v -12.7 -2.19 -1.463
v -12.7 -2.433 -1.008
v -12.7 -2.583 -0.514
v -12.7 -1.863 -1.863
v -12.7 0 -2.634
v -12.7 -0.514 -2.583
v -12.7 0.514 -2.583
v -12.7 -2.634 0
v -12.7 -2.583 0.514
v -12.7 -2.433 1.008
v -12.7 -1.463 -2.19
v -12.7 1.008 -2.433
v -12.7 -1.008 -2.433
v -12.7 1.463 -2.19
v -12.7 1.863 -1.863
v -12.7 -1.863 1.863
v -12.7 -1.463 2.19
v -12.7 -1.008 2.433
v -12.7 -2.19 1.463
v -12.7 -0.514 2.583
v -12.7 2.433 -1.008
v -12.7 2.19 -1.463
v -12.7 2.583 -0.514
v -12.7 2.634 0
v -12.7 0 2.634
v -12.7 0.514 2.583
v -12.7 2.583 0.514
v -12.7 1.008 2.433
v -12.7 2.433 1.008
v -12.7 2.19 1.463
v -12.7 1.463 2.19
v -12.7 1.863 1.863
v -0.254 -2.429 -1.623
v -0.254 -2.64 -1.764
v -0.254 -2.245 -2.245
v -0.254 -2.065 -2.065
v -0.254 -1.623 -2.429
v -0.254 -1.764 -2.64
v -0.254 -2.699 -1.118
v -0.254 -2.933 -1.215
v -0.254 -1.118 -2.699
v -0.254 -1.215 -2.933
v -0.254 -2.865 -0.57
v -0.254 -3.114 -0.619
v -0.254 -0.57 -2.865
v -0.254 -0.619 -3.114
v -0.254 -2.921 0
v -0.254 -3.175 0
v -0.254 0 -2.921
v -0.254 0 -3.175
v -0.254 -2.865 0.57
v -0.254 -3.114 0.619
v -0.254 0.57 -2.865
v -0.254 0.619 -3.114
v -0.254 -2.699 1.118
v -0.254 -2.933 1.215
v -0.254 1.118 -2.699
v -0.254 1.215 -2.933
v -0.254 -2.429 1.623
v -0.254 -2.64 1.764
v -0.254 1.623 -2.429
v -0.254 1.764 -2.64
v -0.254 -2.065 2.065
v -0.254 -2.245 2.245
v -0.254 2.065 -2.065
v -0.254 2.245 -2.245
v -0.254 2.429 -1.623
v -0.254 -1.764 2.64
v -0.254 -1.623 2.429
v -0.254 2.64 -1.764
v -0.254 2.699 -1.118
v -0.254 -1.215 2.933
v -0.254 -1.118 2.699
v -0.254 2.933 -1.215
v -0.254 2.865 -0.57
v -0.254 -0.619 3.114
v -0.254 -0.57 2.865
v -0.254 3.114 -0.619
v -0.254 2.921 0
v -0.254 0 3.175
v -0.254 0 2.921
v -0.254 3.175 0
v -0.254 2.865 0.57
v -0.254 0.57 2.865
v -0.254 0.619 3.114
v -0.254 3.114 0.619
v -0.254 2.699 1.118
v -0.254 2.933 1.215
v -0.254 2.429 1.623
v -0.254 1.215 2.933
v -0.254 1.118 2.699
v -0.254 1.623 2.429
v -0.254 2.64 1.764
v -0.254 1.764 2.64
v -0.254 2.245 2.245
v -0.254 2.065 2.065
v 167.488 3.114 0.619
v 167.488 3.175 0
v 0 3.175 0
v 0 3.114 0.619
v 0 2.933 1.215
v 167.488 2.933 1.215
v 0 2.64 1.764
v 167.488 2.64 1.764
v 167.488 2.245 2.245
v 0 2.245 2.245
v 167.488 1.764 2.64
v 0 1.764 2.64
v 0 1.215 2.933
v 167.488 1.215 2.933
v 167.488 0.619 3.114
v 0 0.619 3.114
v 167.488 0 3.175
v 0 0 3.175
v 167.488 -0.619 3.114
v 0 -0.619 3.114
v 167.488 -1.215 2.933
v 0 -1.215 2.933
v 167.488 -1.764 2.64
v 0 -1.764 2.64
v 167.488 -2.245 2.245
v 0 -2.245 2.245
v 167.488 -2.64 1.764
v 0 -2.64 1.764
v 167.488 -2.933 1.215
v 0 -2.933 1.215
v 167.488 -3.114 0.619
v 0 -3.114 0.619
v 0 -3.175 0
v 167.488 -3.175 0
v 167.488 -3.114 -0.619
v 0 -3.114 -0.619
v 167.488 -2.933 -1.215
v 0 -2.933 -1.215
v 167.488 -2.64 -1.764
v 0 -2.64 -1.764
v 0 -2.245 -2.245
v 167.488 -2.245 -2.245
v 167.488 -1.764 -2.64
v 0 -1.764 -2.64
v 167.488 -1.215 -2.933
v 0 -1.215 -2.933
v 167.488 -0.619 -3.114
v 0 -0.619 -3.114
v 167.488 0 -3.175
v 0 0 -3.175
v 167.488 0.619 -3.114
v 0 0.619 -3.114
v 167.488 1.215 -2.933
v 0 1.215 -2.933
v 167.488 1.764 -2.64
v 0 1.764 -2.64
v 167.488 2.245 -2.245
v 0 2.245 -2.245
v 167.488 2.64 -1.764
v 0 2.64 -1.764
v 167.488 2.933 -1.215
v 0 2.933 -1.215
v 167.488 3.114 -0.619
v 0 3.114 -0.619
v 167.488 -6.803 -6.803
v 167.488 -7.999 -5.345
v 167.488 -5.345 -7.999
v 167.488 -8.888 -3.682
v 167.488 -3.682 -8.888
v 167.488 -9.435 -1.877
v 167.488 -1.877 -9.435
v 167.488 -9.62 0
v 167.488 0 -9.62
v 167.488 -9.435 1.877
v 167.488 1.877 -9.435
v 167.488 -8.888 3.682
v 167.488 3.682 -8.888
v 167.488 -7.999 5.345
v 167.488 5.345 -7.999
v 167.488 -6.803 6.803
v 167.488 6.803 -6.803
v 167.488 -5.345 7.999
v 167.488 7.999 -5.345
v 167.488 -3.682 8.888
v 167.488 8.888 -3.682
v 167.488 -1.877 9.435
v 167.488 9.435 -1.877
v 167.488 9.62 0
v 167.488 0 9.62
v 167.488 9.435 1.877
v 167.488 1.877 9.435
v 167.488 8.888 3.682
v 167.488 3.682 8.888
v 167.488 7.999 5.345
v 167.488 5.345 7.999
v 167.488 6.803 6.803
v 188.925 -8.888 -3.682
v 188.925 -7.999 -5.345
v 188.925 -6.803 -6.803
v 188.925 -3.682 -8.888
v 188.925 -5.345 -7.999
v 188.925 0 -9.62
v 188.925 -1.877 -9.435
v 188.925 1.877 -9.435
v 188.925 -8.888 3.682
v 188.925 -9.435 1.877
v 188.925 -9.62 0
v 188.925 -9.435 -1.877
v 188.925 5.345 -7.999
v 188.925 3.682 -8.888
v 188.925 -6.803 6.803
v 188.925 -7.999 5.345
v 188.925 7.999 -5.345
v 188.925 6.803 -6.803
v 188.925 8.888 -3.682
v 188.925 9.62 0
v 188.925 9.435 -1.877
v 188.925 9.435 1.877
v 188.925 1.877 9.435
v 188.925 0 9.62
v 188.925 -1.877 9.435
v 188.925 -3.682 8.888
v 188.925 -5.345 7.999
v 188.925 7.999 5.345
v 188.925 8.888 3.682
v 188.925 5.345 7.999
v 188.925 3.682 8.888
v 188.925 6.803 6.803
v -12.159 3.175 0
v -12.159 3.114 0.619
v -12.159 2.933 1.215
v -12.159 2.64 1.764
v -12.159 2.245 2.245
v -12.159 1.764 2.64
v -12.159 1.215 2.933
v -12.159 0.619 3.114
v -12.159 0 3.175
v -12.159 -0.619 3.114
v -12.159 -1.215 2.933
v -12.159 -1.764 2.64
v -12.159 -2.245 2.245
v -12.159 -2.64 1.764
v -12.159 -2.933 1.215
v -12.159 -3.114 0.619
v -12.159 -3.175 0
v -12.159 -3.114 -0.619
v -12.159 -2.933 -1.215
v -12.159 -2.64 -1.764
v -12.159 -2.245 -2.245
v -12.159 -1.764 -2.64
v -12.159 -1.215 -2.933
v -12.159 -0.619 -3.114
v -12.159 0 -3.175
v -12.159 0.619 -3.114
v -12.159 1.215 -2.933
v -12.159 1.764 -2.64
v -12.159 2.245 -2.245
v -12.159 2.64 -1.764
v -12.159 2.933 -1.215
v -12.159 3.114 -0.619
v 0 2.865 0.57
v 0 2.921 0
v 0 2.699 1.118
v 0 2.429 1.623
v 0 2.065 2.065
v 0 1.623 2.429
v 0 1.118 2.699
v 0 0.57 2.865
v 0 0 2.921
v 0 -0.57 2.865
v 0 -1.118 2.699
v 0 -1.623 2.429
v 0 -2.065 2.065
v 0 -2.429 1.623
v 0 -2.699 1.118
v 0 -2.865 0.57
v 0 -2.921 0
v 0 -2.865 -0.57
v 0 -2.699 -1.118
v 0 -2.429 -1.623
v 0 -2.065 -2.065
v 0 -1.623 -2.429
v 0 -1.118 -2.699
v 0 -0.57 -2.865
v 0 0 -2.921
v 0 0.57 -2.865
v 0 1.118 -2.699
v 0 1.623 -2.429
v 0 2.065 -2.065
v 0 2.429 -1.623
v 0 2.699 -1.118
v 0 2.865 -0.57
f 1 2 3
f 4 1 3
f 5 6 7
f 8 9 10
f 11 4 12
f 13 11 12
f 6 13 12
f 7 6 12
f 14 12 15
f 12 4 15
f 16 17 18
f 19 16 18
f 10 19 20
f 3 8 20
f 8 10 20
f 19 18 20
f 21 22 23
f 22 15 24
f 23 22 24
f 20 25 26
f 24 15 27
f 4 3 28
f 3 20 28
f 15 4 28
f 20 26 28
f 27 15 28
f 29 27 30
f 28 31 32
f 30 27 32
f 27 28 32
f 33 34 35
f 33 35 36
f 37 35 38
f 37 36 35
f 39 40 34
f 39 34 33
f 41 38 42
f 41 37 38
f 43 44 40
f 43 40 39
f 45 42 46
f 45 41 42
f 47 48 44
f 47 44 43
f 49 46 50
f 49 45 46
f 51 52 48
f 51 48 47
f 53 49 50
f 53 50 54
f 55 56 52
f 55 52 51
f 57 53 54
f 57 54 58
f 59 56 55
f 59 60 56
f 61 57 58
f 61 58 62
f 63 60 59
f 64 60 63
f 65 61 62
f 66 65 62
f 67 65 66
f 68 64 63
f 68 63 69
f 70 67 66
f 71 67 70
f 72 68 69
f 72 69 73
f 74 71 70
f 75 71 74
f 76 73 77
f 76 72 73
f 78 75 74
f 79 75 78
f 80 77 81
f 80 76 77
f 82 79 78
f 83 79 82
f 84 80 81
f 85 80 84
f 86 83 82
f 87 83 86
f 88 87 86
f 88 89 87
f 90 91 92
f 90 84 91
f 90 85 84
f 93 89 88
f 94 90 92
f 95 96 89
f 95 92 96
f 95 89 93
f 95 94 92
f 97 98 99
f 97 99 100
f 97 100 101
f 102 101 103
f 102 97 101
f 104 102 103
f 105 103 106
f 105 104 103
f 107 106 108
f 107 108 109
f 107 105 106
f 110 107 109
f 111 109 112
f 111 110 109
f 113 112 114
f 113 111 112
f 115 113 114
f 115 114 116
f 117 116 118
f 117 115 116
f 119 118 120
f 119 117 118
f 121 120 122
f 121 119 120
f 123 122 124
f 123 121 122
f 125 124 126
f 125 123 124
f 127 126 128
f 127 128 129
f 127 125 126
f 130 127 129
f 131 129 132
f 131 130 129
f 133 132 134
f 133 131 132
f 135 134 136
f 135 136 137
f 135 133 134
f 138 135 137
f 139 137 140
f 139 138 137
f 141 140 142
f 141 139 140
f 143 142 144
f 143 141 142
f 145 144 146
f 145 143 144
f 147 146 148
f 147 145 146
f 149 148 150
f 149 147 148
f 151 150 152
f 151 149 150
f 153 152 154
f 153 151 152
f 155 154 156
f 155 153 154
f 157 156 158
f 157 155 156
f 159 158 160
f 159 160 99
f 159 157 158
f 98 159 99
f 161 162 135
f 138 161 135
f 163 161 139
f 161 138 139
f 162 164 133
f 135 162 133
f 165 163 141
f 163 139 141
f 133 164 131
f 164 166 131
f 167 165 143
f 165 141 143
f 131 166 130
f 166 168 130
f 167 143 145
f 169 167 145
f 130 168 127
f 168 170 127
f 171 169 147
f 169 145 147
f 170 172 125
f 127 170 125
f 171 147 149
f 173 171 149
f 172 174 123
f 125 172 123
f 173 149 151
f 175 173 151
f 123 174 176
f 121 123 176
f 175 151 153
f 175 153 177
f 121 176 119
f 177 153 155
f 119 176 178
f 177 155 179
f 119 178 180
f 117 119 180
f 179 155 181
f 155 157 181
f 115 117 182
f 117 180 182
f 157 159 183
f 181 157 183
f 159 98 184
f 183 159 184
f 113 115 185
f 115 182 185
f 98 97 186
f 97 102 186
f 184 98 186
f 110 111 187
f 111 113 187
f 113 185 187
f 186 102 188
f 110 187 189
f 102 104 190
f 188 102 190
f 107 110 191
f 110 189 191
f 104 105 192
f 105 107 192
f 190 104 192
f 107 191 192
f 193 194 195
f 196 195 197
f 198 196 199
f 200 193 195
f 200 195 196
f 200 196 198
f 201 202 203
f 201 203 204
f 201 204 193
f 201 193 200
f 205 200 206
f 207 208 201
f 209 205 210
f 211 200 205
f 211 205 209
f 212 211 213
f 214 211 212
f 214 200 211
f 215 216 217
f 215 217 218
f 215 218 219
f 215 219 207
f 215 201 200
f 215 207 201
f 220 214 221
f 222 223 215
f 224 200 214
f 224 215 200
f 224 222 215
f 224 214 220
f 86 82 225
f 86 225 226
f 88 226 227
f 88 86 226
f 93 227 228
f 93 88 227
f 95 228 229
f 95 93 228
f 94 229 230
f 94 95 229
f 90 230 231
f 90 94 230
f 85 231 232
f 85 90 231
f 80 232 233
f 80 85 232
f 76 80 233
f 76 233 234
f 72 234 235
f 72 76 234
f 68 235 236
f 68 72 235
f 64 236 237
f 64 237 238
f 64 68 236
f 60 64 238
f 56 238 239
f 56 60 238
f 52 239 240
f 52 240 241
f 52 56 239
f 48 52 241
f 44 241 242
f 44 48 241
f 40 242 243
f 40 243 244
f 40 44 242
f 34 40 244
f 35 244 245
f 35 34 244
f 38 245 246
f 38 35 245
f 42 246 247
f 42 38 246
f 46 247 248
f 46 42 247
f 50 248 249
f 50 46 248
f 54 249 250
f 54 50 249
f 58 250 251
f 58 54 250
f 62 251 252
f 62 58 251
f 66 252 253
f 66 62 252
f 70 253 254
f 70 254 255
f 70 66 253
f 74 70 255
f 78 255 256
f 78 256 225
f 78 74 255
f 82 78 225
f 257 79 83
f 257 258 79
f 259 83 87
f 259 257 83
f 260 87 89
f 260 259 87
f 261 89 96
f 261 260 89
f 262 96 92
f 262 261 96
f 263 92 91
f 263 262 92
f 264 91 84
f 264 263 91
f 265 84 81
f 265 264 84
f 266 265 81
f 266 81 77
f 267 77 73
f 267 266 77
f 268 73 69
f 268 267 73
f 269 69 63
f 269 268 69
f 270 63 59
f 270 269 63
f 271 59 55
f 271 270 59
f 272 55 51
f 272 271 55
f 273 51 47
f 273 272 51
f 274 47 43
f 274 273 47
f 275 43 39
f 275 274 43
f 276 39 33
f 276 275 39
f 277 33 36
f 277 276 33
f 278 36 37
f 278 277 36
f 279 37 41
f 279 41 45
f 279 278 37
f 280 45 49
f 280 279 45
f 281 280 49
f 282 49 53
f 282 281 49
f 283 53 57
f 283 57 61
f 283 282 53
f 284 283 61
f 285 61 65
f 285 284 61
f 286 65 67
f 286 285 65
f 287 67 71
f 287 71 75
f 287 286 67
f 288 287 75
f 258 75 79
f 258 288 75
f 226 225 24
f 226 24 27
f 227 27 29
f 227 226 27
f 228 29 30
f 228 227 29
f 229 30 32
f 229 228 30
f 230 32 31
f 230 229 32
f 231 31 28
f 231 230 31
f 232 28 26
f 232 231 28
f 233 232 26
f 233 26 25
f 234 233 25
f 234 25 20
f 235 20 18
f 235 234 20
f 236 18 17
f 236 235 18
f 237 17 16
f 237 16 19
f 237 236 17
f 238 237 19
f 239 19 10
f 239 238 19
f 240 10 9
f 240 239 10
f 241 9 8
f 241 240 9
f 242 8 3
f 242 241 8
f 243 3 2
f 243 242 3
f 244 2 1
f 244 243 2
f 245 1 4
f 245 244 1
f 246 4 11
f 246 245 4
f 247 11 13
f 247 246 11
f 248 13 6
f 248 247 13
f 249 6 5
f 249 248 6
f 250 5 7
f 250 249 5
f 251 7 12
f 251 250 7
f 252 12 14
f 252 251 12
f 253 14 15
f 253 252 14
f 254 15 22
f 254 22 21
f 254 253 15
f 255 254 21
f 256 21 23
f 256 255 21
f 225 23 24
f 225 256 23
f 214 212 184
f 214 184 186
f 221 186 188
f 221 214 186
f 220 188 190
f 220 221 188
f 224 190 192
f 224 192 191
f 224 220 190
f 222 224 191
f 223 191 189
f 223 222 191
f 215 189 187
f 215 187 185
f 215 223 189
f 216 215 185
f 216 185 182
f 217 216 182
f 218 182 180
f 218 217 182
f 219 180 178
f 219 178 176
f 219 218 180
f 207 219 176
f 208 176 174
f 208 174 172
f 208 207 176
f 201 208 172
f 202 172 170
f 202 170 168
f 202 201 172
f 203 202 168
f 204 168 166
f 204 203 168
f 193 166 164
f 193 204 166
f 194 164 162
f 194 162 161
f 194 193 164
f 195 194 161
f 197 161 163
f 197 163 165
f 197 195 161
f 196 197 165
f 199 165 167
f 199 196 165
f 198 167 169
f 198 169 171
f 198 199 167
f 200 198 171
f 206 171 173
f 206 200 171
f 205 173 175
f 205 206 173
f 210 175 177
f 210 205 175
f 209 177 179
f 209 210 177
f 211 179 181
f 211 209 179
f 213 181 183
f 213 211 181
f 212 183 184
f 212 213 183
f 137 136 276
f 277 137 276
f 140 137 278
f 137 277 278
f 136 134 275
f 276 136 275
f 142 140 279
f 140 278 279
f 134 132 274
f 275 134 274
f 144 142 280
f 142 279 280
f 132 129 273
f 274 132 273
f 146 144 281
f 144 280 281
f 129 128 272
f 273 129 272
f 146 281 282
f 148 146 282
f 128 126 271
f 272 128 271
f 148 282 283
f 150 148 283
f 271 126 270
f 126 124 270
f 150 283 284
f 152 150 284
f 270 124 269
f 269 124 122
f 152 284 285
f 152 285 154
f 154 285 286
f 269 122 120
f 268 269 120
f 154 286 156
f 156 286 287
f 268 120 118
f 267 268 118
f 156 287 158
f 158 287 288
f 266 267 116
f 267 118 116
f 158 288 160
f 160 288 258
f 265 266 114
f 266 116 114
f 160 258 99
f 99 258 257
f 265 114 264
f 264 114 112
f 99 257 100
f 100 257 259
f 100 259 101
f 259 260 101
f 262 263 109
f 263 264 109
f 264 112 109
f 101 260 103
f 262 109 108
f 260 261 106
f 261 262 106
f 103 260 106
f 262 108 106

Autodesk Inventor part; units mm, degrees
sketch "Sketch_1" plane through (0, 0, 0) normal (0, 0, 1) x (1, 0, 0)
  line L0 (188.9252, 0) -> (0, 0)
  line L1 (0, 0) -> (0, 3.175)
  line L2 (0, 3.175) -> (167.4876, 3.175)
  line L3 (167.4876, 3.175) -> (167.4876, 9.6203)
  line L4 (167.4876, 9.6203) -> (188.9252, 9.6203)
  line L5 (188.9252, 9.6203) -> (188.9252, 0)
  line L6 (188.9252, 0) -> (0, 0)
revolve "Revolution1" add sketch "Sketch_1" angle 360 about axis through (188.9252, 0, 0) along (1, 0, 0)
sketch "Sketch_3" plane through (0, 0, 0) normal (0, 0, 1) x (1, 0, 0)
  line L0 (0, 0) -> (-12.7, 0)
  line L1 (-12.7, 0) -> (-12.7, 2.634)
  line L2 (-12.7, 2.634) -> (-12.159, 3.175)
  line L3 (-12.159, 3.175) -> (0, 3.175)
  line L4 (0, 3.175) -> (0, 0)
  line L5 (0, 0) -> (-12.7, 0)
revolve "Revolution2" add sketch "Sketch_3" angle 360 about axis through (0, 0, 0) along (1, 0, 0)
thread "Thread1" size "1/4-28 UNF" class "2A" standard "ANSI Unified Screw Threads" length 12.159
sketch "Sketch_30" plane through (0, 0, 0) normal (0, 0, 1) x (1, 0, 0)
  line L0 (0, 0) -> (-0.254, 0)
  line L1 (-0.254, 2.921) -> (0, 2.921)
  line L2 (0, 2.921) -> (0, 3.429)
  line L3 (0, 3.429) -> (-0.254, 3.429)
  line L4 (-0.254, 3.429) -> (-0.254, 2.921)
revolve "Revolution3" cut sketch "Sketch_30" angle 360 about axis through (0, 0, 0) along (1, 0, 0)
ref_plane "dia1_XY" through (0, 3.175, 0) normal (1, 0, 0) x (0, 0, -1)
ref_plane "dia1_YZ" through (0, 3.175, 0) normal (0, 0, -1) x (0, 1, 0)
ref_plane "dia1_ZX" through (0, 3.175, 0) normal (0, 1, 0) x (1, 0, 0)
ref_plane "dia12_XY" through (0, 0, 10.9537) normal (1, 0, 0) x (0, 0, -1)
ref_plane "dia12_YZ" through (0, 0, 10.9537) normal (0, 0, -1) x (0, 1, 0)
ref_plane "dia12_ZX" through (0, 0, 10.9537) normal (0, 1, 0) x (1, 0, 0)
ref_plane "dia2_XY" through (0, -3.175, 0) normal (1, 0, 0) x (0, 0, -1)
ref_plane "dia2_YZ" through (0, -3.175, 0) normal (0, 0, -1) x (0, 1, 0)
ref_plane "dia2_ZX" through (0, -3.175, 0) normal (0, 1, 0) x (1, 0, 0)
ref_plane "dia22_XY" through (0, 0, -10.9537) normal (1, 0, 0) x (0, 0, -1)
ref_plane "dia22_YZ" through (0, 0, -10.9537) normal (0, 0, -1) x (0, 1, 0)
ref_plane "dia22_ZX" through (0, 0, -10.9537) normal (0, 1, 0) x (1, 0, 0)
ref_plane "rl1_XY" through (-12.7, 0, 0) normal (1, 0, 0) x (0, 0, -1)
ref_plane "rl1_YZ" through (-12.7, 0, 0) normal (0, 0, -1) x (0, 1, 0)
ref_plane "rl1_ZX" through (-12.7, 0, 0) normal (0, 1, 0) x (1, 0, 0)
ref_plane "rl2_XY" through (0, 0, 0) normal (1, 0, 0) x (0, 0, -1)
ref_plane "rl2_YZ" through (0, 0, 0) normal (0, 0, -1) x (0, 1, 0)
ref_plane "rl2_ZX" through (0, 0, 0) normal (0, 1, 0) x (1, 0, 0)
ref_plane "rod_cp_XY" through (0, 0, 0) normal (1, 0, 0) x (0, 0, -1)
ref_plane "rod_cp_YZ" through (0, 0, 0) normal (0, 0, -1) x (0, 1, 0)
ref_plane "rod_cp_ZX" through (0, 0, 0) normal (0, 1, 0) x (1, 0, 0)
ref_plane "thd1_XY" through (-12.7, 3.175, 0) normal (1, 0, 0) x (0, 0, -1)
ref_plane "thd1_YZ" through (-12.7, 3.175, 0) normal (0, 0, -1) x (0, 1, 0)
ref_plane "thd1_ZX" through (-12.7, 3.175, 0) normal (0, 1, 0) x (1, 0, 0)
ref_plane "thd2_XY" through (-12.7, -3.175, 0) normal (1, 0, 0) x (0, 0, -1)
ref_plane "thd2_YZ" through (-12.7, -3.175, 0) normal (0, 0, -1) x (0, 1, 0)
ref_plane "thd2_ZX" through (-12.7, -3.175, 0) normal (0, 1, 0) x (1, 0, 0)
ref_plane "to_rod_clevis_XY" through (-16.764, 0, 0) normal (1, 0, 0) x (0, 0, -1)
ref_plane "to_rod_clevis_YZ" through (-16.764, 0, 0) normal (0, 0, -1) x (0, 1, 0)
ref_plane "to_rod_clevis_ZX" through (-16.764, 0, 0) normal (0, 1, 0) x (1, 0, 0)
properties part number "C-045-DP0_rod" material "Steel, Galvanized"
